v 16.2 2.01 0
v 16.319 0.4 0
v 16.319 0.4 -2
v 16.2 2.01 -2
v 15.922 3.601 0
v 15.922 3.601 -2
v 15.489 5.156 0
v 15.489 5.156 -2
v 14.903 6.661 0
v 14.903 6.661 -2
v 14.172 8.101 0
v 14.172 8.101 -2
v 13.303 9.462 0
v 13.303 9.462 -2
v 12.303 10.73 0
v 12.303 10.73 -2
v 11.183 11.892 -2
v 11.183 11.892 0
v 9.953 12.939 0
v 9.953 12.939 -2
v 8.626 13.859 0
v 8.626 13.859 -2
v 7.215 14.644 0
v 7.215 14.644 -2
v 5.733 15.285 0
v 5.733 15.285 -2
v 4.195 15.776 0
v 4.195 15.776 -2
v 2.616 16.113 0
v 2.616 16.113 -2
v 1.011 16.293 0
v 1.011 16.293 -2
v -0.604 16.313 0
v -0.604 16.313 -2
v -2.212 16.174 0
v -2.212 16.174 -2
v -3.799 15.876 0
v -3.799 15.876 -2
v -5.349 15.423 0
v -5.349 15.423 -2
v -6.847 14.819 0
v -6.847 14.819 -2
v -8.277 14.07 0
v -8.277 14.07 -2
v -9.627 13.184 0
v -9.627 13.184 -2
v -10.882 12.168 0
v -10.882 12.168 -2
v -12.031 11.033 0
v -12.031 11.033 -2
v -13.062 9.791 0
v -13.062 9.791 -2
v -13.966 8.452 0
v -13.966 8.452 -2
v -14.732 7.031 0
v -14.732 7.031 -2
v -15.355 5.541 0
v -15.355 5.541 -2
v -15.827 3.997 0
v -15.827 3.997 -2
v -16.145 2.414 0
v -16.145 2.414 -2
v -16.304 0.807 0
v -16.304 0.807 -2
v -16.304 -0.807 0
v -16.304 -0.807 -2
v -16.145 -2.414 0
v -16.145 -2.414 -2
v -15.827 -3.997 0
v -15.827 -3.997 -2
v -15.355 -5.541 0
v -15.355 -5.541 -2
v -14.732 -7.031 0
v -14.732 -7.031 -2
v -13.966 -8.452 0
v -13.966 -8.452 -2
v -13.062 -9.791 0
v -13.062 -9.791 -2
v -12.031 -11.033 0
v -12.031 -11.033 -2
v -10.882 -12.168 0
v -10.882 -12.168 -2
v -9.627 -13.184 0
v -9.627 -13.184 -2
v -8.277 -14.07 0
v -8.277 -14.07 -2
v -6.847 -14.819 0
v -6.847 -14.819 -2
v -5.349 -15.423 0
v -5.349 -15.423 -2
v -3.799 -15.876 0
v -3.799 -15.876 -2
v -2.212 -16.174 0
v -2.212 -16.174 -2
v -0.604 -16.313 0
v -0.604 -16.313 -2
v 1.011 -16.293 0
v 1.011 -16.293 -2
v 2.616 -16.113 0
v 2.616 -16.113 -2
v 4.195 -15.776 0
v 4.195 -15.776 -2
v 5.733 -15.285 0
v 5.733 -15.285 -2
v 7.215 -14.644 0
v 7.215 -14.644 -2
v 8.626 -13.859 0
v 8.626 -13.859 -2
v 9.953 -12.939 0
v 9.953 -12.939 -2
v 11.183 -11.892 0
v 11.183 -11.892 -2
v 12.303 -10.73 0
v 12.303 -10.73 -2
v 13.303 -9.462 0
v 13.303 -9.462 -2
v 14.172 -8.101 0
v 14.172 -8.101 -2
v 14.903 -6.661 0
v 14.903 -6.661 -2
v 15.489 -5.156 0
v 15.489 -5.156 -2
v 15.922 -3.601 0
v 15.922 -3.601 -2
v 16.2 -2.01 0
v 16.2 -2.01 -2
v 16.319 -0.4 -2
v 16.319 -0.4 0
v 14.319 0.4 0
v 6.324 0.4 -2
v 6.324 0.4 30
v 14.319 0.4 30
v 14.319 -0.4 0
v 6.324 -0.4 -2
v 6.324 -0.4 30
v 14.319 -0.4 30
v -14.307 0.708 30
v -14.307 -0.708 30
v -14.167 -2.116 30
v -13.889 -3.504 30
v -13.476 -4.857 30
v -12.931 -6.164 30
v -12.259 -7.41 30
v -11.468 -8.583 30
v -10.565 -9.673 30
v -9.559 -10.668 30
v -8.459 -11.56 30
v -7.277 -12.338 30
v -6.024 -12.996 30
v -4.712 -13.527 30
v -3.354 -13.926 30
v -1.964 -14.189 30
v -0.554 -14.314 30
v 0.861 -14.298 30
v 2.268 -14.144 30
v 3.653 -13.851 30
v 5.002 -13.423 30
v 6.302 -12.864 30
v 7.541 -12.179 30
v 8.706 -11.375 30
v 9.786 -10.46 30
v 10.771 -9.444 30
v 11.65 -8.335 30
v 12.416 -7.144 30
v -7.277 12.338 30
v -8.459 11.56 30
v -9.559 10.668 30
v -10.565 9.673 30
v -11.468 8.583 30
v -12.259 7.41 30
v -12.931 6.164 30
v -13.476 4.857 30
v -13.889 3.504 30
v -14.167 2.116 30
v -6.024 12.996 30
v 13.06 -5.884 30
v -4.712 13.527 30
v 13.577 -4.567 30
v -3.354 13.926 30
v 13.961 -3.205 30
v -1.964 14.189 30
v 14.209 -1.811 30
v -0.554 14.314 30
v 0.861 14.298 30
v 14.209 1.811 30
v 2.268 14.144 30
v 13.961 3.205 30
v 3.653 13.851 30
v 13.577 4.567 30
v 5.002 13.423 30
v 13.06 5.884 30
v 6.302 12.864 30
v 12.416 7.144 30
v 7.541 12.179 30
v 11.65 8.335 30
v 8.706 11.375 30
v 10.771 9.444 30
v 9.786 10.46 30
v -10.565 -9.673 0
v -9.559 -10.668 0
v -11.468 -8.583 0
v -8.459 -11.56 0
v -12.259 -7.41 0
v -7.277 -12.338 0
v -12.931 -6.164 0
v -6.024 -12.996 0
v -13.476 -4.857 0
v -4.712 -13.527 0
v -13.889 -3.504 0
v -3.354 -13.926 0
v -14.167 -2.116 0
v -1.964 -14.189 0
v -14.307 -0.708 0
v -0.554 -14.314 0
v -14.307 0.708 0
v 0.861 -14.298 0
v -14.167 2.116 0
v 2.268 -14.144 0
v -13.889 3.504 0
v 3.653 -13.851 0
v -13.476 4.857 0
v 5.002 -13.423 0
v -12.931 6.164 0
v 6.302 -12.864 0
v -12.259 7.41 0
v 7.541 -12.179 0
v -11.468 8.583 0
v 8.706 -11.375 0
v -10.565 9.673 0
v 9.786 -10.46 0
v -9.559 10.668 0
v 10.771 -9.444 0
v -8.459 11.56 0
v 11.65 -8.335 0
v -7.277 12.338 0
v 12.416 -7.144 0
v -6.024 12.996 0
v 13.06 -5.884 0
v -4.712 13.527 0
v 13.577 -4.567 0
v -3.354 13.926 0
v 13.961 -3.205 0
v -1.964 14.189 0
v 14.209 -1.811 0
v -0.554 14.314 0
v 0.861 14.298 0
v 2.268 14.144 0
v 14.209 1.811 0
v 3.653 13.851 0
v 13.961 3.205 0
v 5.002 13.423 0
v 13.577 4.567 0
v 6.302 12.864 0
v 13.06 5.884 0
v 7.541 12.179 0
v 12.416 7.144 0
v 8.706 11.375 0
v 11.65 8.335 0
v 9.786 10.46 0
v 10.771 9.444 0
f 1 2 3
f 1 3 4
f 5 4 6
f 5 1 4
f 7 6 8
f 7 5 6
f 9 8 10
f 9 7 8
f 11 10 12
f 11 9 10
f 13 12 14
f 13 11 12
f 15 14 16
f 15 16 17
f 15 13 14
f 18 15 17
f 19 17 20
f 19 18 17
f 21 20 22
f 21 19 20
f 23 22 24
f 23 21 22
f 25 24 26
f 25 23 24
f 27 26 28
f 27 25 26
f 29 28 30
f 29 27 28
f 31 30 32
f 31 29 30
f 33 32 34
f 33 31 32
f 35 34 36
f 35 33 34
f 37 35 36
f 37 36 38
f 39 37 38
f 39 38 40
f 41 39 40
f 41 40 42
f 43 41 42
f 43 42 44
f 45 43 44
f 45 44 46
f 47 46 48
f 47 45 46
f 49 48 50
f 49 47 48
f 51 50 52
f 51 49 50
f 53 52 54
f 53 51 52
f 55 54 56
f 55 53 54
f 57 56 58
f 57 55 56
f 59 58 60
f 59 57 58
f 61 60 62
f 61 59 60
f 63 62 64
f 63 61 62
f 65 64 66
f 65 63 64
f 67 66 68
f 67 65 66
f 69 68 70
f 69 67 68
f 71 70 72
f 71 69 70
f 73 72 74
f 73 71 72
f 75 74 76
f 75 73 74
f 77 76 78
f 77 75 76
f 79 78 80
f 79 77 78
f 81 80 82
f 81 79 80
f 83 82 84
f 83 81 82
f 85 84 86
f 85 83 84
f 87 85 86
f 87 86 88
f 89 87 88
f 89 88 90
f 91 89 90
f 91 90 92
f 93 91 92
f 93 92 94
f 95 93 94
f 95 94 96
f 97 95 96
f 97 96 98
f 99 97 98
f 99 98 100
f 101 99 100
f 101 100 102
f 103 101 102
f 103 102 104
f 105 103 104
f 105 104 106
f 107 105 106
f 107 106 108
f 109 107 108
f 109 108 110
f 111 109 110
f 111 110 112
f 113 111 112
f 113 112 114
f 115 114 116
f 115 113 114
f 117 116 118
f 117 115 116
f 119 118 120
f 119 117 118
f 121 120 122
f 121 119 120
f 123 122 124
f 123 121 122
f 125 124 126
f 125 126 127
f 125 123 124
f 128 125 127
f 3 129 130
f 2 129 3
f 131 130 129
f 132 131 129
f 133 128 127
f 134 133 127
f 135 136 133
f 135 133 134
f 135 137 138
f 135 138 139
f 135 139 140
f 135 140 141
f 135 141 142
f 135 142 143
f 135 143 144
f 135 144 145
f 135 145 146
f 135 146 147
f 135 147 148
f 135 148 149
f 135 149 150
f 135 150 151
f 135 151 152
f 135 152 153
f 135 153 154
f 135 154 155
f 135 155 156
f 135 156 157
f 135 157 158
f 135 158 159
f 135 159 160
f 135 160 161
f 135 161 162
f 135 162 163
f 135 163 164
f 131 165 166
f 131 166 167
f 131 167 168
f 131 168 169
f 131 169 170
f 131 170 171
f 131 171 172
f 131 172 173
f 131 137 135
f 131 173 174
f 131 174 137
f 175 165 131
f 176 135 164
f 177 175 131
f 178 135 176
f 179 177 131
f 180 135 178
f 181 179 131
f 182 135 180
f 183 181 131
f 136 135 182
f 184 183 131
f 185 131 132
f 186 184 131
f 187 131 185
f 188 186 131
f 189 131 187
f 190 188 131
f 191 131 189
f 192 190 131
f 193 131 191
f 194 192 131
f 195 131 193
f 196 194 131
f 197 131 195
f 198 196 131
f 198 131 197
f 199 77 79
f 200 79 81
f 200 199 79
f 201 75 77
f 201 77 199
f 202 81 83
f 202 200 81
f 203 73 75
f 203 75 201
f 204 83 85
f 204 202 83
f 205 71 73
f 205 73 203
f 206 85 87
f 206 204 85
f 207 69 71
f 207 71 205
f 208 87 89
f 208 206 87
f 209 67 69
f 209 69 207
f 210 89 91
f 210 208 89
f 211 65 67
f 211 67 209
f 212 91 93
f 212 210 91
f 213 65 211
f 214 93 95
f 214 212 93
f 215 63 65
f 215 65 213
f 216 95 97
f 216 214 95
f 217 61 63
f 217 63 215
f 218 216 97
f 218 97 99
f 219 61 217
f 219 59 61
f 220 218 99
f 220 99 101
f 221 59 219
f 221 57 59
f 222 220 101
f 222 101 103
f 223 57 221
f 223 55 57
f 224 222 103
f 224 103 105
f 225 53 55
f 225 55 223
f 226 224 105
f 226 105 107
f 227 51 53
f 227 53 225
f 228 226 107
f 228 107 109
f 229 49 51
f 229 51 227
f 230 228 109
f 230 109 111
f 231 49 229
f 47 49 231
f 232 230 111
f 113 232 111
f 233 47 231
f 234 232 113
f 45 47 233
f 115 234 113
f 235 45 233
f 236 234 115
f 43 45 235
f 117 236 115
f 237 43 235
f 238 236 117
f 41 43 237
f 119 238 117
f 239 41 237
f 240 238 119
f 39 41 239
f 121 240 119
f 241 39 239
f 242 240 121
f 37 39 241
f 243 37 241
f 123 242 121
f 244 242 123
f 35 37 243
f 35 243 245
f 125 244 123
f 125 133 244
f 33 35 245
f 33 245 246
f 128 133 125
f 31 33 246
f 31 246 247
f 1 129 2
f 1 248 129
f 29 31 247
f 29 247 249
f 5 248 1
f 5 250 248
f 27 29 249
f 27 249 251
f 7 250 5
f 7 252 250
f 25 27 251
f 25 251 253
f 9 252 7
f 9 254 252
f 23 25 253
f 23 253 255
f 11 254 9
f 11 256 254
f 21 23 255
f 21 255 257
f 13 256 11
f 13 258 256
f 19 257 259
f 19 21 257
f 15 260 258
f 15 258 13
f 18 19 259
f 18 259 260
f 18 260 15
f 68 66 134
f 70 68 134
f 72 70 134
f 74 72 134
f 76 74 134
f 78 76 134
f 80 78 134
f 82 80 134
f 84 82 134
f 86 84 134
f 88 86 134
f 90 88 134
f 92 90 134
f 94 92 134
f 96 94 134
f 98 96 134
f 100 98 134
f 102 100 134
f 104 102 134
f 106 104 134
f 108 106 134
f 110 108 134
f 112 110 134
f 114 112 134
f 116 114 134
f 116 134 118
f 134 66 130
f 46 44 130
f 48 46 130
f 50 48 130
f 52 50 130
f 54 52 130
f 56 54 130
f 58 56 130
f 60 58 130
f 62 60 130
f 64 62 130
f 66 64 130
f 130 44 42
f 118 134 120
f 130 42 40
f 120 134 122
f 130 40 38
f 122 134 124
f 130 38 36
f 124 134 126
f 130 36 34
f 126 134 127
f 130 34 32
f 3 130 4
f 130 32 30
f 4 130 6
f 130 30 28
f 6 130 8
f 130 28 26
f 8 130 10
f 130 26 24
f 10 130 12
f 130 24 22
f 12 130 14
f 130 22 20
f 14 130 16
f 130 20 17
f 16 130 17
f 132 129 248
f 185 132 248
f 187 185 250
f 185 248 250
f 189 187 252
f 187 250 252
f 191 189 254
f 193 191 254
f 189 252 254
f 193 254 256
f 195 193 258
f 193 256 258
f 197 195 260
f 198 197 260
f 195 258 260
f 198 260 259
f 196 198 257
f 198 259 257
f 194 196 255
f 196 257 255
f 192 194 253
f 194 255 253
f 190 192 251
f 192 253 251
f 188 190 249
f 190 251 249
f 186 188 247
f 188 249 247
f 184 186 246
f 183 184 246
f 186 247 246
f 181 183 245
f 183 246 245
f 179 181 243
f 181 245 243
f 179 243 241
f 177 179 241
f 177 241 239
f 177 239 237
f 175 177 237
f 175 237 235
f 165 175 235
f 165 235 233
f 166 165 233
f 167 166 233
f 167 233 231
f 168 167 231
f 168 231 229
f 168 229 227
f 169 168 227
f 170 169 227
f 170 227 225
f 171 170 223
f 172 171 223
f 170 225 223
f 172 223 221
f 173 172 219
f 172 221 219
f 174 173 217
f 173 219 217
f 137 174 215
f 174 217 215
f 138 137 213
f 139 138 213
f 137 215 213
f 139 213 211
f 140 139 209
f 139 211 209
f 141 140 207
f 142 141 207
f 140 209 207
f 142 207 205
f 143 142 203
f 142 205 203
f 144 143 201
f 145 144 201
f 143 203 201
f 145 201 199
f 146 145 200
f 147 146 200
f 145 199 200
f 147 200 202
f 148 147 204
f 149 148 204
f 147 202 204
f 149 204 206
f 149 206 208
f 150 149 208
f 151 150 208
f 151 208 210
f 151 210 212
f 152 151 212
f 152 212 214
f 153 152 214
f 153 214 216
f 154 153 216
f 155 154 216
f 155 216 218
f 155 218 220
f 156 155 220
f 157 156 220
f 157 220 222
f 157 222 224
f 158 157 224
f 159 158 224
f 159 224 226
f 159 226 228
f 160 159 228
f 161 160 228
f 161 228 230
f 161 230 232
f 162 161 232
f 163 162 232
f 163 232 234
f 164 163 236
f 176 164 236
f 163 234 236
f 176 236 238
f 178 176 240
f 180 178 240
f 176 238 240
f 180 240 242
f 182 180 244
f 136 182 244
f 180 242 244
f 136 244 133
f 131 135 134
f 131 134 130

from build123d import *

# Parameters (mm, degrees)
F1_DEPTH = 30
F2_DEPTH = 2


with BuildPart() as f1:
    # F0 (on Top) → F1 (new body)
    with BuildSketch(Plane.XY):
        with BuildLine():
            Line((6.324367, 0.4), (14.318781, 0.4))
            ThreePointArc((14.318781, 0.4), (-14.324367, 0), (14.318781, -0.4))
            Line((14.318781, -0.4), (6.324367, -0.4))
            Line((6.324367, -0.4), (6.324367, 0.4))
        make_face()
    extrude(amount=F1_DEPTH)

    # F0 (on Top) → F2 (join)
    with BuildSketch(Plane.XY):
        with BuildLine():
            ThreePointArc((14.318781, -0.4), (-14.324367, 0), (14.318781, 0.4))
            Line((14.318781, 0.4), (16.319466, 0.4))
            ThreePointArc((16.319466, 0.4), (-16.324367, 0), (16.319466, -0.4))
            Line((16.319466, -0.4), (14.318781, -0.4))
        make_face()
        with BuildLine():
            Line((6.324367, 0.4), (14.318781, 0.4))
            ThreePointArc((14.318781, 0.4), (-14.324367, 0), (14.318781, -0.4))
            Line((14.318781, -0.4), (6.324367, -0.4))
            Line((6.324367, -0.4), (6.324367, 0.4))
        make_face()
    extrude(amount=-F2_DEPTH)


solid = f1.part
